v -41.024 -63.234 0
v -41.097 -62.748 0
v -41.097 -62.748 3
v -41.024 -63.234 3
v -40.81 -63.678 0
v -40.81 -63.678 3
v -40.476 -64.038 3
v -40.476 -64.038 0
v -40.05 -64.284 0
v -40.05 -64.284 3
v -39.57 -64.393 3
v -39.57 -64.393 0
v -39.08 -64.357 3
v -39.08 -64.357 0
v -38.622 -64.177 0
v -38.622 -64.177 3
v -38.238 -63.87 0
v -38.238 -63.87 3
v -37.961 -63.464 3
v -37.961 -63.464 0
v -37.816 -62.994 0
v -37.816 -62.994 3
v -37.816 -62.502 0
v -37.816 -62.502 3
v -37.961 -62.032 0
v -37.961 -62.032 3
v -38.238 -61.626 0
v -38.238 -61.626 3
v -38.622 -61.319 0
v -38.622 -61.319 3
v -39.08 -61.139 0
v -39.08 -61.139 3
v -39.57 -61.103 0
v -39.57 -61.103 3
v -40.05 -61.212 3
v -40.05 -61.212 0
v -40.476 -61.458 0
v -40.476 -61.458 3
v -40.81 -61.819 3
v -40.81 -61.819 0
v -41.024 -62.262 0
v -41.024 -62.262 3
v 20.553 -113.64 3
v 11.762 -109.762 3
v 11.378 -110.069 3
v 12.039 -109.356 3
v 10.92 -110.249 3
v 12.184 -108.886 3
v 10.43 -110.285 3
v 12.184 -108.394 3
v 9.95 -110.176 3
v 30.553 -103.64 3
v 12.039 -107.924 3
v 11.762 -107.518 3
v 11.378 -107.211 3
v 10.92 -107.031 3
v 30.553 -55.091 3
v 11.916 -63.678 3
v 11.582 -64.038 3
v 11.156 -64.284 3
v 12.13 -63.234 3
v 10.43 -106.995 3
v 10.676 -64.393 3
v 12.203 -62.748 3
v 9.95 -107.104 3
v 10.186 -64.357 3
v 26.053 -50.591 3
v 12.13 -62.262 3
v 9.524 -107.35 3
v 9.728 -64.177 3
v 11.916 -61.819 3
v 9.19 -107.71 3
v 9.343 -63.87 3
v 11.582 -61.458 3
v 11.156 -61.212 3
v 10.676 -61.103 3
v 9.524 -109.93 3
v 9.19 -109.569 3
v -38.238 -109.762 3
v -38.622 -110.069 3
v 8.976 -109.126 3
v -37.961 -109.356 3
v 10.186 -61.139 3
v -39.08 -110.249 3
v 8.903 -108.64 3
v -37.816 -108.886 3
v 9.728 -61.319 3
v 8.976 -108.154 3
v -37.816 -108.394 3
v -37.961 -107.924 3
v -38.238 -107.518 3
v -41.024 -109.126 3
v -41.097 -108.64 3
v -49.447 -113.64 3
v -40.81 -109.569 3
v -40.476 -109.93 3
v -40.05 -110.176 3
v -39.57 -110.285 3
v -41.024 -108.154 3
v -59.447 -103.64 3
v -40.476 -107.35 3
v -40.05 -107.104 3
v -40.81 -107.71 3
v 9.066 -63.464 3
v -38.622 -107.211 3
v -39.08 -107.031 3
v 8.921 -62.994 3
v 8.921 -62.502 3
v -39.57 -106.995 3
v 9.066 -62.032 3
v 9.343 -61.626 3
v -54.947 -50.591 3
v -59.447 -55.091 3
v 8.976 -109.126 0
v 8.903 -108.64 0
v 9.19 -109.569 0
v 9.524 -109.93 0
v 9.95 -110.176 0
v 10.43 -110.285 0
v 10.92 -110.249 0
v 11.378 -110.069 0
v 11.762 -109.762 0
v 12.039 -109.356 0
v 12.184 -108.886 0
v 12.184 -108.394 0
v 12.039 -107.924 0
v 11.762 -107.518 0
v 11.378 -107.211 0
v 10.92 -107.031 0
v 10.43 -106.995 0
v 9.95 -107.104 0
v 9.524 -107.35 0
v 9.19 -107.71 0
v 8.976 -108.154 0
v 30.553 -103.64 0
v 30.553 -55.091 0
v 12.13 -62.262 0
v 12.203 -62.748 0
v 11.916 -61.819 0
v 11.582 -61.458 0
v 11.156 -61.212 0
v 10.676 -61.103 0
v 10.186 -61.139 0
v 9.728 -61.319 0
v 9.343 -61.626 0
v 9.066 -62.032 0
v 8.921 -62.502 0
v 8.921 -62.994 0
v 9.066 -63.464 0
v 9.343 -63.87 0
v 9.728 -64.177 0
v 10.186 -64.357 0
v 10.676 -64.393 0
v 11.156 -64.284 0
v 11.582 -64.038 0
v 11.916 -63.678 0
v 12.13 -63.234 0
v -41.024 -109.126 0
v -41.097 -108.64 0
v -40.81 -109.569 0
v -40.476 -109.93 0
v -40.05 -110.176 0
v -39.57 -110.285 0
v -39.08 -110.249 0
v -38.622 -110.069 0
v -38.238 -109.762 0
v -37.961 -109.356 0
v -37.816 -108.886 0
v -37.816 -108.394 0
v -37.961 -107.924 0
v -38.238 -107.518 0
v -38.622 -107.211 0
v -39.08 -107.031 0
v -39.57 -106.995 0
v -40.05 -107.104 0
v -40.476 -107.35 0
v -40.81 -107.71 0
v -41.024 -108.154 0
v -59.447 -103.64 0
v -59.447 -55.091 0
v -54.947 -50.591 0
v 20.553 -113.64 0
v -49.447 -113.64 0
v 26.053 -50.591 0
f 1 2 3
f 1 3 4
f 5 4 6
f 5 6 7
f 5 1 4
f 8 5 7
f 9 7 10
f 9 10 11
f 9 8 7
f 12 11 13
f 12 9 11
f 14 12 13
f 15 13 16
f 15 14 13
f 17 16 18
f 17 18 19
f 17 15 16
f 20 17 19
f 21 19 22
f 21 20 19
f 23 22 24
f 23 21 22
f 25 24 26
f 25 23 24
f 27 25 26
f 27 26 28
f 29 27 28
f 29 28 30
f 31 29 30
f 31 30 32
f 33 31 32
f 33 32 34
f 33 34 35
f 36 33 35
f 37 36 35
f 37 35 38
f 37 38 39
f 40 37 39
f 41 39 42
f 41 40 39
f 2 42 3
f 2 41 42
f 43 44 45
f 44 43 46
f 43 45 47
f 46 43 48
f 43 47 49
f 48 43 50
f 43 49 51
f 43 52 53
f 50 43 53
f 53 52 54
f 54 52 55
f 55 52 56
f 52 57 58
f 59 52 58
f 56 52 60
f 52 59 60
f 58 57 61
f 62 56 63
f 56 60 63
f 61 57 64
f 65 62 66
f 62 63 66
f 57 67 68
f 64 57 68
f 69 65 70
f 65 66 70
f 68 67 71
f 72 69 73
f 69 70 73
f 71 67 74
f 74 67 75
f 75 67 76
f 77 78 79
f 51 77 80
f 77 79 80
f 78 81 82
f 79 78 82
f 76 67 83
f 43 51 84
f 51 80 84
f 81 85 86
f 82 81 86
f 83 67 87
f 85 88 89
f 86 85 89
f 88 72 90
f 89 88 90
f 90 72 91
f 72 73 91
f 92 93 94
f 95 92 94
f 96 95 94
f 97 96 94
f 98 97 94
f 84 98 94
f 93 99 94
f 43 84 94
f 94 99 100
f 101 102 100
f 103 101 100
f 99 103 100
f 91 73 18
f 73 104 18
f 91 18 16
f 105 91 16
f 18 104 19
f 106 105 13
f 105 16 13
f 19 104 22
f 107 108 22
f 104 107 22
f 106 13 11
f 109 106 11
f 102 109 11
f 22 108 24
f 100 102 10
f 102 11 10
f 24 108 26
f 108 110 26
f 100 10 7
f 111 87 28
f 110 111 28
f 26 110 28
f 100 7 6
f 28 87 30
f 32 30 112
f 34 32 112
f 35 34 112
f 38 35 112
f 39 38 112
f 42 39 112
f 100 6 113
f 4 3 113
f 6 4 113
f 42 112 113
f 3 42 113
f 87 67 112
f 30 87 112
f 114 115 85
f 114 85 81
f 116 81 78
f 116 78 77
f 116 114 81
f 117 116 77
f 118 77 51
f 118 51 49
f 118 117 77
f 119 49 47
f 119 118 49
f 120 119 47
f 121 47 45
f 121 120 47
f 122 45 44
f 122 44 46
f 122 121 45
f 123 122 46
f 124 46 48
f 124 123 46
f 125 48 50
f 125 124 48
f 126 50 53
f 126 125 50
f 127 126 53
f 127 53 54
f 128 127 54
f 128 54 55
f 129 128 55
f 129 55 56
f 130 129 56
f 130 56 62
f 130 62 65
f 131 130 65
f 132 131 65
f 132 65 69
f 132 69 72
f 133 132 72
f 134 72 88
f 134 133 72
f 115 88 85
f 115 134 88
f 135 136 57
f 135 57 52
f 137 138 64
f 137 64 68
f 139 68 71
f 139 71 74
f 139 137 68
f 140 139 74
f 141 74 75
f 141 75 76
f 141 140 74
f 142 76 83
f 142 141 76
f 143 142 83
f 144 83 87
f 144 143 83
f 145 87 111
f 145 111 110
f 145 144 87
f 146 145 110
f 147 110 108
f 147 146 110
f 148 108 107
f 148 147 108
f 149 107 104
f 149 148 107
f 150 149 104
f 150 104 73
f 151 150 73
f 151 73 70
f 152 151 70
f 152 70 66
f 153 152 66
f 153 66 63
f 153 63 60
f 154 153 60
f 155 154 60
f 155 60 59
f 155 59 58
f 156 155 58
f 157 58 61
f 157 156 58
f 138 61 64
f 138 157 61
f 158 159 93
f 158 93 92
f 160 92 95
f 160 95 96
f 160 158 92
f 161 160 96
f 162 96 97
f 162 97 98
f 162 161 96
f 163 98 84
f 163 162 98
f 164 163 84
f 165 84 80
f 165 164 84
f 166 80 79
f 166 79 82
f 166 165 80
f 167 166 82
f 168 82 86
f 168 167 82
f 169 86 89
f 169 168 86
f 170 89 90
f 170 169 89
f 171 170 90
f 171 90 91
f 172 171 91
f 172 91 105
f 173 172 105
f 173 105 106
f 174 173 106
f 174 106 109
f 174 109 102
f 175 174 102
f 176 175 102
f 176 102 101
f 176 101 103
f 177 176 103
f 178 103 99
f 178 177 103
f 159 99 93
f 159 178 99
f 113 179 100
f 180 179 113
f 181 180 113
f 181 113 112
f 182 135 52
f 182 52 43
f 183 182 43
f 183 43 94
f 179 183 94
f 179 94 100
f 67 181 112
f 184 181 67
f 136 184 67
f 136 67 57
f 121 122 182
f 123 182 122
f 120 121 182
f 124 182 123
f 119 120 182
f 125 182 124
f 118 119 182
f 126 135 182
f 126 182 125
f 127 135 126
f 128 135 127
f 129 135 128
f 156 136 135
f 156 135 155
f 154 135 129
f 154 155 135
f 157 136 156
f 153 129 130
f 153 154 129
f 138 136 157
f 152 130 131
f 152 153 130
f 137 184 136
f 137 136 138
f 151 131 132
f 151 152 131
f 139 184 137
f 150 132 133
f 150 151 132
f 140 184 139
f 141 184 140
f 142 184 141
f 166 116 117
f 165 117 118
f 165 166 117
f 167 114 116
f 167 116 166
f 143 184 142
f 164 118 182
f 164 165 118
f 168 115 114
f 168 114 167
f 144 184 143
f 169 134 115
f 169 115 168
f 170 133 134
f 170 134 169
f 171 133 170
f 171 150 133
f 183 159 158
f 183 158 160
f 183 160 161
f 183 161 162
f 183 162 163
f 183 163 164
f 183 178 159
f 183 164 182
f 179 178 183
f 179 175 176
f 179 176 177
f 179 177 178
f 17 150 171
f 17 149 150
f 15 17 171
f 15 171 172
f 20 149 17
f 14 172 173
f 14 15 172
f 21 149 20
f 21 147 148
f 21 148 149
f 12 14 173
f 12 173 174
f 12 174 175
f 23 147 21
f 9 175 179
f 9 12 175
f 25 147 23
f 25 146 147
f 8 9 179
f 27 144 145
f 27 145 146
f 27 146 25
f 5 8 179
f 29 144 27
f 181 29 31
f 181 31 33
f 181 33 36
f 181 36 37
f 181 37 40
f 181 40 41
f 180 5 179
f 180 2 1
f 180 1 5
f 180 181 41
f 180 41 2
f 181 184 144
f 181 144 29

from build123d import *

# Parameters (mm, degrees)
SKETCH1_R           = 1.65
SKETCH1_W           = 3
SKETCH1_H           = 20
SKETCH1_W_2         = 24
SKETCH1_H_2         = 22.230872535
BOSS_EXTRUDE2_DEPTH = 3
SKETCH3_W           = 102.87568526
SKETCH3_H           = 126.113289936
CUT_EXTRUDE1_DEPTH  = 10


with BuildPart() as part:
    # Sketch1 → Boss-Extrude2 (new body)
    with BuildSketch(Plane.XY):
        Polygon((-59.447183423, 47.780041818), (-49.447183423, 57.780041818), (20.552816577, 57.780041818), (30.552816577, 47.780041818), (30.552816577, -0.7691812), (26.052816577, -5.2691812), (25.552816577, -5.2691812), (25.552816577, -50.590735163), (26.052816577, -50.590735163), (30.552816577, -55.090735163), (30.552816577, -103.639958182), (20.552816577, -113.639958182), (-49.447183423, -113.639958182), (-59.447183423, -103.639958182), (-59.447183423, -55.090735163), (-54.947183423, -50.590735163), (-54.447183423, -50.590735163), (-54.447183423, -5.2691812), (-54.947183423, -5.2691812), (-59.447183423, -0.7691812), align=None)
        with Locations((-39.447183423, 52.780041818)):
            Circle(SKETCH1_R, mode=Mode.SUBTRACT)
        with Locations((10.552816577, 52.780041818)):
            Circle(SKETCH1_R, mode=Mode.SUBTRACT)
        with Locations(Location((10.552816577, -108.639958182, 0), (0, 0, 180))):
            Circle(SKETCH1_R, mode=Mode.SUBTRACT)
        with Locations(Location((-39.447183423, -108.639958182, 0), (0, 0, 180))):
            Circle(SKETCH1_R, mode=Mode.SUBTRACT)
        with Locations((10.552816577, -62.748057161)):
            Circle(SKETCH1_R, mode=Mode.SUBTRACT)
        with Locations(Location((-39.447183423, -62.748057161, 0), (0, 0, 180))):
            Circle(SKETCH1_R, mode=Mode.SUBTRACT)
        with Locations((-27.947183423, 11.175041818)):
            Rectangle(SKETCH1_W, SKETCH1_H, mode=Mode.SUBTRACT)
        with Locations((-0.947183423, 11.175041818)):
            Rectangle(SKETCH1_W, SKETCH1_H, mode=Mode.SUBTRACT)
        with Locations((-14.447183423, -27.929958181)):
            Rectangle(SKETCH1_W_2, SKETCH1_H_2, mode=Mode.SUBTRACT)
    extrude(amount=BOSS_EXTRUDE2_DEPTH)

    # Sketch3 → Cut-Extrude1 (cut)
    with BuildSketch(Plane.XY.offset(3)):
        with Locations((-8.901321225, 12.465909805)):
            Rectangle(SKETCH3_W, SKETCH3_H)
    extrude(amount=-CUT_EXTRUDE1_DEPTH, mode=Mode.SUBTRACT)


solid = part.part
